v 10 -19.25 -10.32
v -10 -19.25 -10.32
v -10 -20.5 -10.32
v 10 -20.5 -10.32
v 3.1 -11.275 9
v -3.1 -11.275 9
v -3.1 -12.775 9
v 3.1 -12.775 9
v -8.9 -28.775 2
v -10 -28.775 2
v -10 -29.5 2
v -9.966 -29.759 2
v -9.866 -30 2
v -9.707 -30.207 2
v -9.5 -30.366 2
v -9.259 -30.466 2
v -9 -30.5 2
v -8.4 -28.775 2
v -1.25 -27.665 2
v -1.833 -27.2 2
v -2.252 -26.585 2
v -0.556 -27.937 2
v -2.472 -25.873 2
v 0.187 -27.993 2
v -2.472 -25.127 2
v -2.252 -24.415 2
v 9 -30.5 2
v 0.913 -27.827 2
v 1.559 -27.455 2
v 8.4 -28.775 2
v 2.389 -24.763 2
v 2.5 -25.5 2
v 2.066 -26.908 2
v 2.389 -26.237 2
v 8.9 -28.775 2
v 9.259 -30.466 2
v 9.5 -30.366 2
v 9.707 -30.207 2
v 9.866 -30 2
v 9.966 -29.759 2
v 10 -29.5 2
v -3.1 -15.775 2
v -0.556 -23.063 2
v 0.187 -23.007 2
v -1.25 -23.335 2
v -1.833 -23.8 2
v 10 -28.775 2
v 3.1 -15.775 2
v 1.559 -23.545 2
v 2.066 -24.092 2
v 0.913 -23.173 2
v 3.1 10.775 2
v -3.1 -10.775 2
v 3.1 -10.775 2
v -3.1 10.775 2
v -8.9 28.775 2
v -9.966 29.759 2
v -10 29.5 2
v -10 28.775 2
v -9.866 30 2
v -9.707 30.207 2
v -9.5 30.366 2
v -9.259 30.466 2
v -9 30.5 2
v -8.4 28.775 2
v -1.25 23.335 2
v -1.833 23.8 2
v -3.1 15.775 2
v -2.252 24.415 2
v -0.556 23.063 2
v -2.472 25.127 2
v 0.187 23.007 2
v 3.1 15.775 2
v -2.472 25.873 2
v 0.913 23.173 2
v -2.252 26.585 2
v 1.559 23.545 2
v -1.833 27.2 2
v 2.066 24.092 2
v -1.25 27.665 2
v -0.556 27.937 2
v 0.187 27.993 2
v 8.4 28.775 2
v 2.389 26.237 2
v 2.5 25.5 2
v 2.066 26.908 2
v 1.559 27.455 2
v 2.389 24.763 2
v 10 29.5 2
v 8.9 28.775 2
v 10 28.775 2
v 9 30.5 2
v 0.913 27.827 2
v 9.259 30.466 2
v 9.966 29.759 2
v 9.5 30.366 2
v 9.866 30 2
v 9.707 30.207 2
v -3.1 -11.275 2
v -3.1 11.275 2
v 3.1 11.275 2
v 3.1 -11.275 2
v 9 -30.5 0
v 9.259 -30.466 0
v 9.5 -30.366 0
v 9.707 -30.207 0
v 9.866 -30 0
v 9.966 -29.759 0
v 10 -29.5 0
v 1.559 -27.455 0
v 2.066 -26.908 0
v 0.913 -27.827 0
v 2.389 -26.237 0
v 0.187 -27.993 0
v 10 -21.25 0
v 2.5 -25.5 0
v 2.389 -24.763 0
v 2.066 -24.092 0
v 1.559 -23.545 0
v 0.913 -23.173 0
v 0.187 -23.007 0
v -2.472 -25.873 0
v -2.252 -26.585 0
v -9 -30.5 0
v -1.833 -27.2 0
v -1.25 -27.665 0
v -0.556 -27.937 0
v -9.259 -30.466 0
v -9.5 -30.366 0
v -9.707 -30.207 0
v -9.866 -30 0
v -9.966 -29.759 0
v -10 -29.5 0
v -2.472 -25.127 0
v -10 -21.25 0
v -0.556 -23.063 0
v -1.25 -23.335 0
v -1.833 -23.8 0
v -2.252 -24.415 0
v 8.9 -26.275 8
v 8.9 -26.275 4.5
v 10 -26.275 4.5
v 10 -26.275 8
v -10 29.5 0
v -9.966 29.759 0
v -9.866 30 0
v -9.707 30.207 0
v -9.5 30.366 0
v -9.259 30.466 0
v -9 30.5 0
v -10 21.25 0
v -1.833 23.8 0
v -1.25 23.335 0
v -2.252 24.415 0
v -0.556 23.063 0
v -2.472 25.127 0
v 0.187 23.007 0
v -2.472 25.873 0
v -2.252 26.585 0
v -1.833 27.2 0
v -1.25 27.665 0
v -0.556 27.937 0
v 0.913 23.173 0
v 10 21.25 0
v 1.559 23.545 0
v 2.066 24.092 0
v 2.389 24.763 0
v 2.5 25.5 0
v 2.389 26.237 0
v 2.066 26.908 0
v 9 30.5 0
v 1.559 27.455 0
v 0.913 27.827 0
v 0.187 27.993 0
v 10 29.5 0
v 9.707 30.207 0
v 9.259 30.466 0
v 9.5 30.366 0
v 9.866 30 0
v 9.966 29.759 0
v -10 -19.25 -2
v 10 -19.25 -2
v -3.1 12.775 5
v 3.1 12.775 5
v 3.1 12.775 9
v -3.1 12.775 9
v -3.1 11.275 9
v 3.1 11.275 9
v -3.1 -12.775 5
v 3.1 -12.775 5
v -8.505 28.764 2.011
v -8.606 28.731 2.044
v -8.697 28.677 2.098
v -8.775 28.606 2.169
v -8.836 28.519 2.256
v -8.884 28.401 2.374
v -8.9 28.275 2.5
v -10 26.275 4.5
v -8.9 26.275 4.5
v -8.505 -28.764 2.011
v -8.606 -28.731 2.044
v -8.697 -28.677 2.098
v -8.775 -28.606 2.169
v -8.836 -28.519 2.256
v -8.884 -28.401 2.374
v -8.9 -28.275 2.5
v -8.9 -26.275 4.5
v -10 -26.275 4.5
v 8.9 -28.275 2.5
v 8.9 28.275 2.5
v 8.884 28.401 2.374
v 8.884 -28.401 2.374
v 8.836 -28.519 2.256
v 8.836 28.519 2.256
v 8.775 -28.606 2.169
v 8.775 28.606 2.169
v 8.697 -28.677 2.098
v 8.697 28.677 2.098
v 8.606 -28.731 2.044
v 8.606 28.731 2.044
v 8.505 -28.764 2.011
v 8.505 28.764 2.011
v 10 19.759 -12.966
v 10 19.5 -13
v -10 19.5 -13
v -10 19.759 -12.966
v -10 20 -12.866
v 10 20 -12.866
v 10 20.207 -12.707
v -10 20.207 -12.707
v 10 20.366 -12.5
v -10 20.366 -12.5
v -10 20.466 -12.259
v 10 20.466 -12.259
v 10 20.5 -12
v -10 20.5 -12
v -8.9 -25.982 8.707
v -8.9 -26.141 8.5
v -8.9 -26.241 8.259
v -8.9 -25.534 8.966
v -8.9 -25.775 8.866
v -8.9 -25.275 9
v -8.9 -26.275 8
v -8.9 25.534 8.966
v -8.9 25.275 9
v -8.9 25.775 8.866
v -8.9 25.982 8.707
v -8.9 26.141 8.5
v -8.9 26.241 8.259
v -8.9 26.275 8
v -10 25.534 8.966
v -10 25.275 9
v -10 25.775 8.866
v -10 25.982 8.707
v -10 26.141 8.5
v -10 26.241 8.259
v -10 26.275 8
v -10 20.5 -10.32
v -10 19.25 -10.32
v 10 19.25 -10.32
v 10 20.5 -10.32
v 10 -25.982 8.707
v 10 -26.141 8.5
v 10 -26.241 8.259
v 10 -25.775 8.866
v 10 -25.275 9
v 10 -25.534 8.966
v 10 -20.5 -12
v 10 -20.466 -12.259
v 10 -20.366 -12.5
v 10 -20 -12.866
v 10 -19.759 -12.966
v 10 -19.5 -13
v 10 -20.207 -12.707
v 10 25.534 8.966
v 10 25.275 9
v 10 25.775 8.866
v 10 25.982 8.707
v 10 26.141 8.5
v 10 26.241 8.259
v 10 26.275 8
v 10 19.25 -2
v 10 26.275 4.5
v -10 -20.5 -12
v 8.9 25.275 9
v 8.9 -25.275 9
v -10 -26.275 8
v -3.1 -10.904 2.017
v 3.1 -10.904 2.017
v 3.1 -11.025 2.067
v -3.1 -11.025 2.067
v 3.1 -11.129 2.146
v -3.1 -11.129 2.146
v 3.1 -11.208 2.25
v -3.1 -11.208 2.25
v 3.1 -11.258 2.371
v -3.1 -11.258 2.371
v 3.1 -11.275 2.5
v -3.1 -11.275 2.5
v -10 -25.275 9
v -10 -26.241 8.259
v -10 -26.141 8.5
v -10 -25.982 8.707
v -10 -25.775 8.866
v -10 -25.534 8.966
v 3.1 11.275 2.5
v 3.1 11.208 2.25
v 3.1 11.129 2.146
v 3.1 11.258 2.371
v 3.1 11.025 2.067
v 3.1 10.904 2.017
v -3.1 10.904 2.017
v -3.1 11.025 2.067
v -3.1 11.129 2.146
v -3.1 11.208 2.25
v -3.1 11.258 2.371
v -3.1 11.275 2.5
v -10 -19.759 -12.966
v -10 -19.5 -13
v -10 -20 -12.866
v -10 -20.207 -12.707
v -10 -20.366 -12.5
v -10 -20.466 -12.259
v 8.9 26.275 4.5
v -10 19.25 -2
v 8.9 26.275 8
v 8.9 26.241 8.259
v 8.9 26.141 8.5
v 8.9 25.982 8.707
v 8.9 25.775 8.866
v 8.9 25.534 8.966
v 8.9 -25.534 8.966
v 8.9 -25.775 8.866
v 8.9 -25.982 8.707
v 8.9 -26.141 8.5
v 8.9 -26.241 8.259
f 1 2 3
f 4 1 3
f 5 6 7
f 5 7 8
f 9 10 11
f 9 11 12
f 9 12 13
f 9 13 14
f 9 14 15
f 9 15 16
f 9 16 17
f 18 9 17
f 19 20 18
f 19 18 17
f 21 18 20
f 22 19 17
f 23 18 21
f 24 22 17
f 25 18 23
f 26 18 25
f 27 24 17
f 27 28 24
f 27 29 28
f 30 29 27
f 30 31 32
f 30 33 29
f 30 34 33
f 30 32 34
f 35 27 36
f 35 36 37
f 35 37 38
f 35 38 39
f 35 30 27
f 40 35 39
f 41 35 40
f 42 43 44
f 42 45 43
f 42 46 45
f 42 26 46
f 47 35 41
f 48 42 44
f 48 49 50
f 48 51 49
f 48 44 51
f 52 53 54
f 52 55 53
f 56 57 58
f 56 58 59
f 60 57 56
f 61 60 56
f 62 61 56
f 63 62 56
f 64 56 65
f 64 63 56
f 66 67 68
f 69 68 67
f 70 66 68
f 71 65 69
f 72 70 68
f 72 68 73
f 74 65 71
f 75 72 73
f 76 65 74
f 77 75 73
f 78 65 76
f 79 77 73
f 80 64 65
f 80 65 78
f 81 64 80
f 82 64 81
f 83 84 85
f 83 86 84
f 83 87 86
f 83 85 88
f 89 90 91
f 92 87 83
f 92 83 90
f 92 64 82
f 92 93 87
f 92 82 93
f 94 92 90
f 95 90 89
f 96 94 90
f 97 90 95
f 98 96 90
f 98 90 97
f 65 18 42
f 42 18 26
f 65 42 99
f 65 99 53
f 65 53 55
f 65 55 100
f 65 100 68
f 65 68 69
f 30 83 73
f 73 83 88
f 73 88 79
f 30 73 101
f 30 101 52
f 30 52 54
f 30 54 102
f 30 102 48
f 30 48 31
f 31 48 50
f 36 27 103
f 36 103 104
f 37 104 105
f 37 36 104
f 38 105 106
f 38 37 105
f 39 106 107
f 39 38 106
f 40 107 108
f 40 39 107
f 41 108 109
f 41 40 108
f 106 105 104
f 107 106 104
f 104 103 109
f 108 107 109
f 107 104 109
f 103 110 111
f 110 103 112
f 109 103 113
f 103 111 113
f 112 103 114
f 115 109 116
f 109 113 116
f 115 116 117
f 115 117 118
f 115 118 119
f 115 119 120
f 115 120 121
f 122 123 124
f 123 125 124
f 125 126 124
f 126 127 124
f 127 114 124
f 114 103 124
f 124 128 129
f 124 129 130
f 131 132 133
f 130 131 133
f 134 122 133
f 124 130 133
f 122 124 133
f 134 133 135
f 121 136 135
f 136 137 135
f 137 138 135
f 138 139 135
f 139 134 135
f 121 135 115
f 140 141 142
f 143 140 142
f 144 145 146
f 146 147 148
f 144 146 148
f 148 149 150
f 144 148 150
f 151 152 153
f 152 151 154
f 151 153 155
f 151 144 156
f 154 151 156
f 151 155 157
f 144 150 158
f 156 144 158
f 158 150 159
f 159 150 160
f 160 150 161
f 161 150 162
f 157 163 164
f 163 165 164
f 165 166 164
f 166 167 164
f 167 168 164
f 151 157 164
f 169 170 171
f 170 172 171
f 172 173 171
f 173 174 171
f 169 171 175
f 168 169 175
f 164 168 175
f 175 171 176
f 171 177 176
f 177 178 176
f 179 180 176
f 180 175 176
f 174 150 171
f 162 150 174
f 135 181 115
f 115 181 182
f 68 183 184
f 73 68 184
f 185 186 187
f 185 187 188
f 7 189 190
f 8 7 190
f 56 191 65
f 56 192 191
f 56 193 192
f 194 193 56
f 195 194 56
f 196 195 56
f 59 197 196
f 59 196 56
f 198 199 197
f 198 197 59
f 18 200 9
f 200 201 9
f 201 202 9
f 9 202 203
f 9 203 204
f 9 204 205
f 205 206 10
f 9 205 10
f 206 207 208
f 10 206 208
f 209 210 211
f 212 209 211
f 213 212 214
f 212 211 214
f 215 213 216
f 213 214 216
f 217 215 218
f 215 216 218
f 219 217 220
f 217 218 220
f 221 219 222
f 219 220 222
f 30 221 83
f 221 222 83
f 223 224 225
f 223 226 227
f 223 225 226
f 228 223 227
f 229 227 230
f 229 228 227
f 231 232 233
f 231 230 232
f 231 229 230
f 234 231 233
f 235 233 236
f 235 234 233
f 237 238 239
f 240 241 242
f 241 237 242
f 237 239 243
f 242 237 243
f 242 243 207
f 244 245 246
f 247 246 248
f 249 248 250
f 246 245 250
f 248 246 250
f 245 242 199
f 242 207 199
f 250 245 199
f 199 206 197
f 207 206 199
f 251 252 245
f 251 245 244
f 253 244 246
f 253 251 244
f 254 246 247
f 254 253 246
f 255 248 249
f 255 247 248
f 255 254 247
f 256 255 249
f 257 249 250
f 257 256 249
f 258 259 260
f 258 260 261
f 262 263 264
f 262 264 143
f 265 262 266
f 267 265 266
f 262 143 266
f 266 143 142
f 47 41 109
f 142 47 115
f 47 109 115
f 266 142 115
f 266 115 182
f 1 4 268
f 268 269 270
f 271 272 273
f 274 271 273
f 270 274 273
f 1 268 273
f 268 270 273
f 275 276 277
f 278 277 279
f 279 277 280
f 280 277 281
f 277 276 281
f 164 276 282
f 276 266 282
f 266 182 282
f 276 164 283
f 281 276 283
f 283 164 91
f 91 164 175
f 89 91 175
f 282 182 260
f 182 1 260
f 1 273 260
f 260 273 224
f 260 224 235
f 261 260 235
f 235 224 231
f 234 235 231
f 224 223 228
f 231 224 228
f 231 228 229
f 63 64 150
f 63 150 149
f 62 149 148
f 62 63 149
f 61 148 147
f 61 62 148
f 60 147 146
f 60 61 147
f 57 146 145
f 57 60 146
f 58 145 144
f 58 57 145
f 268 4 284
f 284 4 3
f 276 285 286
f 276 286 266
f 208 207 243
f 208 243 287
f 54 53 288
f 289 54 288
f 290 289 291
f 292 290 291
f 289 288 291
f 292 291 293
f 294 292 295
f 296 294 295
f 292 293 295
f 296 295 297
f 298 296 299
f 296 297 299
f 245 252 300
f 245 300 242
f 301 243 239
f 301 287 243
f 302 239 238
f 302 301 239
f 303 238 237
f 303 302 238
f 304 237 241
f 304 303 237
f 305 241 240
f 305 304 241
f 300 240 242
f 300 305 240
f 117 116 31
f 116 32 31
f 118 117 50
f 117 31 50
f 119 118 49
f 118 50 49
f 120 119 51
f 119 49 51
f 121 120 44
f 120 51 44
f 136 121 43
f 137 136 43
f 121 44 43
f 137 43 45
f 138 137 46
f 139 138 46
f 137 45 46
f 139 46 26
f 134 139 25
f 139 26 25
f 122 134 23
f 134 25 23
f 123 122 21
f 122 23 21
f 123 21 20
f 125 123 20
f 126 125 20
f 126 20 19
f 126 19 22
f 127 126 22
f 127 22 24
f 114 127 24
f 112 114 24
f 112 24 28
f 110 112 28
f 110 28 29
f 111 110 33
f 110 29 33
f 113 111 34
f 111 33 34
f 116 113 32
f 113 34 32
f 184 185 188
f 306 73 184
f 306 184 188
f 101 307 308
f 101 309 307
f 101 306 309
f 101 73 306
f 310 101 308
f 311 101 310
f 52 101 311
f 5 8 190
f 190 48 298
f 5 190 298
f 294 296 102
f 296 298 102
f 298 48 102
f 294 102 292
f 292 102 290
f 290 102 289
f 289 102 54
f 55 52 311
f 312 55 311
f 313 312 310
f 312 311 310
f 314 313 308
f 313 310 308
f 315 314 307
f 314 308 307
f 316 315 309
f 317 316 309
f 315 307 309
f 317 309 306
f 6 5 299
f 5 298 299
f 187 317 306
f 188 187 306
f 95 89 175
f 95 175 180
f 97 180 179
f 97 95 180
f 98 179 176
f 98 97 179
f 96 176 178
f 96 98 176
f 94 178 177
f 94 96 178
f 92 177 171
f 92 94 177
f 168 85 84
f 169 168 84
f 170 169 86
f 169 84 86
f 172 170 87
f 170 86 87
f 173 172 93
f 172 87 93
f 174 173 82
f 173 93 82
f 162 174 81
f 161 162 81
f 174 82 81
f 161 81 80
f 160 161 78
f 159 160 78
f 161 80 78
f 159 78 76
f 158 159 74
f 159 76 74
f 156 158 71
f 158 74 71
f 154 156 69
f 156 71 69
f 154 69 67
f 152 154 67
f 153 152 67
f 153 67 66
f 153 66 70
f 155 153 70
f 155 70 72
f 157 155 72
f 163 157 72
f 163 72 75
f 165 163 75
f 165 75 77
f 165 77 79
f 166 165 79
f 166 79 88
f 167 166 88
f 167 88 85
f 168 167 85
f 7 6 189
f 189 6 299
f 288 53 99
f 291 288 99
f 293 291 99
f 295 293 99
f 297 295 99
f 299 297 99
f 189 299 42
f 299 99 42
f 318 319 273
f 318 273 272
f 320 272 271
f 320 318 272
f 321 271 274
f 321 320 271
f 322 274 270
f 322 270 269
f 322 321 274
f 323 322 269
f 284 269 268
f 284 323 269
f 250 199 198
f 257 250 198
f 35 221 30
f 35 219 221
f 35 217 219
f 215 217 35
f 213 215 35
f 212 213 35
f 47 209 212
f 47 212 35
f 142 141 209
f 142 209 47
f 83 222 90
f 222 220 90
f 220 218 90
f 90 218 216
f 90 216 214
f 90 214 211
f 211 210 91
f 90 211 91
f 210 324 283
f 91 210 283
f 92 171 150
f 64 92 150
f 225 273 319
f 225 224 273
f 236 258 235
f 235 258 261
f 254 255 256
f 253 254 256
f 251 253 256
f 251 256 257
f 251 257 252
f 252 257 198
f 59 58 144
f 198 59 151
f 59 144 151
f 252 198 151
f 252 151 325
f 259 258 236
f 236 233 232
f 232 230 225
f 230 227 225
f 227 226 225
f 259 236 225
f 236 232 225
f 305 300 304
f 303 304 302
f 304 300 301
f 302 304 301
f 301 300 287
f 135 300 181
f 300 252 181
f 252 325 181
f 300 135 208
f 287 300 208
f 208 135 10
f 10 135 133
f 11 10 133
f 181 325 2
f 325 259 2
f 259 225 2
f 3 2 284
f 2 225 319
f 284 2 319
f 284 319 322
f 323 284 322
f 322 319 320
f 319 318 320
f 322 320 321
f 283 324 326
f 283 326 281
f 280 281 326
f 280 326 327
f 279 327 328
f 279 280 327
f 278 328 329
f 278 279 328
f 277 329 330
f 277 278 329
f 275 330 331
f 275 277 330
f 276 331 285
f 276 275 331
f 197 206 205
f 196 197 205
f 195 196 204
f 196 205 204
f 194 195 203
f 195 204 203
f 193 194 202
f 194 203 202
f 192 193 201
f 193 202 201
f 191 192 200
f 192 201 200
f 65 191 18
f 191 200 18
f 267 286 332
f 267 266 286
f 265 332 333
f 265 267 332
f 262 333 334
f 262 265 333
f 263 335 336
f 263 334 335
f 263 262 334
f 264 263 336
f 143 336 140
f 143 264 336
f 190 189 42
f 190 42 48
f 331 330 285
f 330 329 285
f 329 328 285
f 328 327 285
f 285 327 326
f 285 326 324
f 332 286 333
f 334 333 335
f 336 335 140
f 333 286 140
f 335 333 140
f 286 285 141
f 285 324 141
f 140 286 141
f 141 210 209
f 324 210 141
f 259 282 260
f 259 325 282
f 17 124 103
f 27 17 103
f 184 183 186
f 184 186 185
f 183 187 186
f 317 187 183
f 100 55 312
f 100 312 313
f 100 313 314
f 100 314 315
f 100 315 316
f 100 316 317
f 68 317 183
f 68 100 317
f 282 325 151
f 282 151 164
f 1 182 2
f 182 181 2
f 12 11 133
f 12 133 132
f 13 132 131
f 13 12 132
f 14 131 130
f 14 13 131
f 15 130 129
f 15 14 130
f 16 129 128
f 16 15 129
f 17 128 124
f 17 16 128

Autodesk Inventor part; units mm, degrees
ref_plane "YZ Plane" through (0, 0, 0) normal (1, 0, 0) x (0, 1, 0)
ref_plane "XZ Plane" through (0, 0, 0) normal (0, 1, 0) x (-1, 0, 0)
ref_plane "XY Plane" through (0, 0, 0) normal (0, 0, 1) x (1, 0, 0)
sketch "Skizze1" plane through (0, 0, 0) normal (0, 0, 1) x (1, 0, 0)
  line L0 (-10, -30.5) -> (10, -30.5)
  line L1 (10, -30.5) -> (10, 30.5)
  line L2 (10, 30.5) -> (-10, 30.5)
  line L3 (-10, 30.5) -> (-10, -30.5)
  line L4 (-10, -30.5) -> (10, 30.5) construction
  line L5 (10, -30.5) -> (-10, 30.5) construction
  point P0 (0, 0)
  dimension "d0" = 20
  dimension "d1" = 61
extrude "Extrusion1" add sketch "Skizze1" along normal blind 2
sketch "Skizze3" plane through (0, 0, 0) normal (0, 0, -1) x (-1, 0, 0)
  line L0 (10, 30.5) -> (10, -30.5) projected
  line L1 (-10, -20.5) -> (10, -20.5)
  line L2 (10, -20.5) -> (10, 20.5)
  line L3 (10, 20.5) -> (-10, 20.5)
  line L4 (-10, 20.5) -> (-10, -20.5)
  line L5 (-10, -20.5) -> (10, 20.5) construction
  line L6 (10, -20.5) -> (-10, 20.5) construction
  line L7 (10, -30.5) -> (-10, -30.5) projected
  line L8 (-10, -30.5) -> (-10, 30.5) projected
  point P0 (0, 0)
  point P1 (10, -20.5)
  dimension "d9" = 41
  dimension "d17" = 10
extrude "Extrusion3" add sketch "Skizze3" along normal blind 13 contours L0 L1 L4 L3
sketch "Skizze4" plane through (-10, -30.5, 2) normal (-1, 0, 0) x (0, 0, 1)
  line L0 (-2, 10) -> (-15, 10) projected
  line L1 (-12.32, 10) -> (-2, 10)
  line L2 (-2, 10) -> (-2, 11.25)
  line L3 (-2, 11.25) -> (-12.32, 11.25)
  line L4 (-12.32, 11.25) -> (-12.32, 10)
  line L5 (-15, 10) -> (-15, 51) projected
  line L6 (-4.404, 30.5) -> (2.981, 30.5) construction
  line L7 (-2, 51) -> (-15, 51)
  line L8 (-2, 51) -> (-2, 49.75)
  line L9 (-2, 49.75) -> (-12.32, 49.75)
  line L10 (-12.32, 49.75) -> (-12.32, 51)
  line L11 (-2, 10) -> (-12.32, 10)
  point P0 (-2, 30.5)
  point P1 (-12.32, 10.625)
  dimension "d12" = 2.68
  dimension "d13" = 1.25
extrude "Extrusion4" cut sketch "Skizze4" against normal through all
fillet "Rundung1" radius 1 6 edges at (-10, -30.5, 1) (10, -30.5, 1) (10, 30.5, 1) (-10, 30.5, 1) (0, 20.5, -13) (0, -20.5, -13)
sketch "Skizze6" plane through (0, 0, 2) normal (0, 0, 1) x (1, 0, 0)
  point P0 (0, 0)
sketch "Skizze7" plane through (0, 0, 2) normal (0, 0, 1) x (1, 0, 0)
  line L0 (-8.9, 11.275) -> (8.9, 11.275)
  line L1 (8.9, 11.275) -> (8.9, -11.275)
  line L2 (8.9, -11.275) -> (-8.9, -11.275)
  line L3 (-8.9, -11.275) -> (-8.9, 11.275)
  line L4 (-8.9, 11.275) -> (8.9, -11.275) construction
  line L5 (8.9, 11.275) -> (-8.9, -11.275) construction
  line L6 (-8.9, 11.275) -> (-10, 11.275)
  line L7 (-10, 11.275) -> (-10, -11.275)
  line L8 (-10, -11.275) -> (-8.9, -11.275)
  line L9 (8.9, 11.275) -> (10, 11.275)
  line L10 (10, 11.275) -> (10, -11.275)
  line L11 (10, -11.275) -> (8.9, -11.275)
  line L12 (10, -29.5) -> (10, 29.5) projected
  line L13 (-10, 29.5) -> (-10, -29.5) projected
  line L14 (-3.1, 12.775) -> (3.1, 12.775)
  line L15 (3.1, 12.775) -> (3.1, 11.275)
  line L16 (3.1, 11.275) -> (-3.1, 11.275)
  line L17 (-3.1, 11.275) -> (-3.1, 12.775)
  line L18 (-3.1, 12.775) -> (3.1, 11.275) construction
  line L19 (3.1, 12.775) -> (-3.1, 11.275) construction
  line L20 (-0.8378, 0) -> (1.8317, 0) construction
  line L21 (-3.1, -12.775) -> (3.1, -12.775)
  line L22 (3.1, -12.775) -> (3.1, -11.275)
  line L23 (3.1, -11.275) -> (-3.1, -11.275)
  line L24 (-3.1, -11.275) -> (-3.1, -12.775)
  line L25 (10, 11.275) -> (8.9, 11.275)
  line L26 (8.9, 11.275) -> (8.9, 26.275)
  line L27 (8.9, 26.275) -> (10, 26.275)
  line L28 (10, 26.275) -> (10, 11.275)
  line L29 (0, 1.7909) -> (0, -1.8992) construction
  line L30 (8.9, -11.275) -> (10, -11.275)
  line L31 (10, 29.5) -> (10, -29.5)
  line L32 (8.9, -11.275) -> (8.9, -26.275)
  line L33 (8.9, -26.275) -> (10, -26.275)
  line L34 (-8.9, 11.275) -> (-10, 11.275)
  line L35 (-10, -11.275) -> (-8.9, -11.275)
  line L36 (-10, -29.5) -> (-10, 29.5)
  line L37 (-8.9, 11.275) -> (-8.9, 26.275)
  line L38 (-8.9, 26.275) -> (-10, 26.275)
  line L39 (-8.9, -11.275) -> (-8.9, -26.275)
  line L40 (-8.9, -26.275) -> (-10, -26.275)
  point P0 (0, 0)
  point P1 (0, 0)
  point P2 (0, 12.025)
  point P3 (8.9, 18.775)
  dimension "d36" = 17.8
  dimension "d37" = 22.55
  dimension "d38" = 6.2
  dimension "d39" = 1.5
  dimension "d45" = 15
extrude "Extrusion5" add sketch "Skizze7" along normal blind 7 contours L3 L8 L7 L6 | L6 L13 L38 L37 | L17 L14 L15 L0 | L39 L40 L13 L8 | L2 L22 L21 L24 | L9 L10 L11 L1 | L26 L27 L12 L9 | L11 L12 L33 L32
chamfer "Fasen1" distance 2 angle 45 2 edges at (0, -19.25, 0) (0, 19.25, 0)
chamfer "Fasen2" distance 3 angle 45 2 edges at (0, 12.775, 2) (0, -12.775, 2)
chamfer "Fasen3" distance 2.5 angle 45 4 edges at (9.45, -26.275, 2) (-9.45, -26.275, 2) (-9.45, 26.275, 2) (9.45, 26.275, 2)
sketch "Skizze8" plane through (0, 0, 2) normal (0, 0, 1) x (1, 0, 0)
  circle A0 centre (0, 25.5) radius 2.5
  line L0 (1.3354, 0) -> (-2.5, 0) construction
  circle A1 centre (0, -25.5) radius 2.5
  line L1 (9, 30.5) -> (-9, 30.5) projected
  point P0 (0, 0)
  point P1 (0, 30.5)
  dimension "d52" = 5
  dimension "d55" = 5
extrude "Extrusion6" cut sketch "Skizze8" against normal through all
fillet "Rundung2" radius 1 4 edges at (-9.45, -26.275, 9) (9.45, -26.275, 9) (-9.45, 26.275, 9) (9.45, 26.275, 9)
fillet "Rundung3" radius 0.5 2 edges at (-8.9, 0, 2) (8.9, 0, 2)
fillet "Rundung4" radius 0.5 2 edges at (0, -11.275, 2) (0, 11.275, 2)
properties part number "Relais_Platte_3D-Druck"
